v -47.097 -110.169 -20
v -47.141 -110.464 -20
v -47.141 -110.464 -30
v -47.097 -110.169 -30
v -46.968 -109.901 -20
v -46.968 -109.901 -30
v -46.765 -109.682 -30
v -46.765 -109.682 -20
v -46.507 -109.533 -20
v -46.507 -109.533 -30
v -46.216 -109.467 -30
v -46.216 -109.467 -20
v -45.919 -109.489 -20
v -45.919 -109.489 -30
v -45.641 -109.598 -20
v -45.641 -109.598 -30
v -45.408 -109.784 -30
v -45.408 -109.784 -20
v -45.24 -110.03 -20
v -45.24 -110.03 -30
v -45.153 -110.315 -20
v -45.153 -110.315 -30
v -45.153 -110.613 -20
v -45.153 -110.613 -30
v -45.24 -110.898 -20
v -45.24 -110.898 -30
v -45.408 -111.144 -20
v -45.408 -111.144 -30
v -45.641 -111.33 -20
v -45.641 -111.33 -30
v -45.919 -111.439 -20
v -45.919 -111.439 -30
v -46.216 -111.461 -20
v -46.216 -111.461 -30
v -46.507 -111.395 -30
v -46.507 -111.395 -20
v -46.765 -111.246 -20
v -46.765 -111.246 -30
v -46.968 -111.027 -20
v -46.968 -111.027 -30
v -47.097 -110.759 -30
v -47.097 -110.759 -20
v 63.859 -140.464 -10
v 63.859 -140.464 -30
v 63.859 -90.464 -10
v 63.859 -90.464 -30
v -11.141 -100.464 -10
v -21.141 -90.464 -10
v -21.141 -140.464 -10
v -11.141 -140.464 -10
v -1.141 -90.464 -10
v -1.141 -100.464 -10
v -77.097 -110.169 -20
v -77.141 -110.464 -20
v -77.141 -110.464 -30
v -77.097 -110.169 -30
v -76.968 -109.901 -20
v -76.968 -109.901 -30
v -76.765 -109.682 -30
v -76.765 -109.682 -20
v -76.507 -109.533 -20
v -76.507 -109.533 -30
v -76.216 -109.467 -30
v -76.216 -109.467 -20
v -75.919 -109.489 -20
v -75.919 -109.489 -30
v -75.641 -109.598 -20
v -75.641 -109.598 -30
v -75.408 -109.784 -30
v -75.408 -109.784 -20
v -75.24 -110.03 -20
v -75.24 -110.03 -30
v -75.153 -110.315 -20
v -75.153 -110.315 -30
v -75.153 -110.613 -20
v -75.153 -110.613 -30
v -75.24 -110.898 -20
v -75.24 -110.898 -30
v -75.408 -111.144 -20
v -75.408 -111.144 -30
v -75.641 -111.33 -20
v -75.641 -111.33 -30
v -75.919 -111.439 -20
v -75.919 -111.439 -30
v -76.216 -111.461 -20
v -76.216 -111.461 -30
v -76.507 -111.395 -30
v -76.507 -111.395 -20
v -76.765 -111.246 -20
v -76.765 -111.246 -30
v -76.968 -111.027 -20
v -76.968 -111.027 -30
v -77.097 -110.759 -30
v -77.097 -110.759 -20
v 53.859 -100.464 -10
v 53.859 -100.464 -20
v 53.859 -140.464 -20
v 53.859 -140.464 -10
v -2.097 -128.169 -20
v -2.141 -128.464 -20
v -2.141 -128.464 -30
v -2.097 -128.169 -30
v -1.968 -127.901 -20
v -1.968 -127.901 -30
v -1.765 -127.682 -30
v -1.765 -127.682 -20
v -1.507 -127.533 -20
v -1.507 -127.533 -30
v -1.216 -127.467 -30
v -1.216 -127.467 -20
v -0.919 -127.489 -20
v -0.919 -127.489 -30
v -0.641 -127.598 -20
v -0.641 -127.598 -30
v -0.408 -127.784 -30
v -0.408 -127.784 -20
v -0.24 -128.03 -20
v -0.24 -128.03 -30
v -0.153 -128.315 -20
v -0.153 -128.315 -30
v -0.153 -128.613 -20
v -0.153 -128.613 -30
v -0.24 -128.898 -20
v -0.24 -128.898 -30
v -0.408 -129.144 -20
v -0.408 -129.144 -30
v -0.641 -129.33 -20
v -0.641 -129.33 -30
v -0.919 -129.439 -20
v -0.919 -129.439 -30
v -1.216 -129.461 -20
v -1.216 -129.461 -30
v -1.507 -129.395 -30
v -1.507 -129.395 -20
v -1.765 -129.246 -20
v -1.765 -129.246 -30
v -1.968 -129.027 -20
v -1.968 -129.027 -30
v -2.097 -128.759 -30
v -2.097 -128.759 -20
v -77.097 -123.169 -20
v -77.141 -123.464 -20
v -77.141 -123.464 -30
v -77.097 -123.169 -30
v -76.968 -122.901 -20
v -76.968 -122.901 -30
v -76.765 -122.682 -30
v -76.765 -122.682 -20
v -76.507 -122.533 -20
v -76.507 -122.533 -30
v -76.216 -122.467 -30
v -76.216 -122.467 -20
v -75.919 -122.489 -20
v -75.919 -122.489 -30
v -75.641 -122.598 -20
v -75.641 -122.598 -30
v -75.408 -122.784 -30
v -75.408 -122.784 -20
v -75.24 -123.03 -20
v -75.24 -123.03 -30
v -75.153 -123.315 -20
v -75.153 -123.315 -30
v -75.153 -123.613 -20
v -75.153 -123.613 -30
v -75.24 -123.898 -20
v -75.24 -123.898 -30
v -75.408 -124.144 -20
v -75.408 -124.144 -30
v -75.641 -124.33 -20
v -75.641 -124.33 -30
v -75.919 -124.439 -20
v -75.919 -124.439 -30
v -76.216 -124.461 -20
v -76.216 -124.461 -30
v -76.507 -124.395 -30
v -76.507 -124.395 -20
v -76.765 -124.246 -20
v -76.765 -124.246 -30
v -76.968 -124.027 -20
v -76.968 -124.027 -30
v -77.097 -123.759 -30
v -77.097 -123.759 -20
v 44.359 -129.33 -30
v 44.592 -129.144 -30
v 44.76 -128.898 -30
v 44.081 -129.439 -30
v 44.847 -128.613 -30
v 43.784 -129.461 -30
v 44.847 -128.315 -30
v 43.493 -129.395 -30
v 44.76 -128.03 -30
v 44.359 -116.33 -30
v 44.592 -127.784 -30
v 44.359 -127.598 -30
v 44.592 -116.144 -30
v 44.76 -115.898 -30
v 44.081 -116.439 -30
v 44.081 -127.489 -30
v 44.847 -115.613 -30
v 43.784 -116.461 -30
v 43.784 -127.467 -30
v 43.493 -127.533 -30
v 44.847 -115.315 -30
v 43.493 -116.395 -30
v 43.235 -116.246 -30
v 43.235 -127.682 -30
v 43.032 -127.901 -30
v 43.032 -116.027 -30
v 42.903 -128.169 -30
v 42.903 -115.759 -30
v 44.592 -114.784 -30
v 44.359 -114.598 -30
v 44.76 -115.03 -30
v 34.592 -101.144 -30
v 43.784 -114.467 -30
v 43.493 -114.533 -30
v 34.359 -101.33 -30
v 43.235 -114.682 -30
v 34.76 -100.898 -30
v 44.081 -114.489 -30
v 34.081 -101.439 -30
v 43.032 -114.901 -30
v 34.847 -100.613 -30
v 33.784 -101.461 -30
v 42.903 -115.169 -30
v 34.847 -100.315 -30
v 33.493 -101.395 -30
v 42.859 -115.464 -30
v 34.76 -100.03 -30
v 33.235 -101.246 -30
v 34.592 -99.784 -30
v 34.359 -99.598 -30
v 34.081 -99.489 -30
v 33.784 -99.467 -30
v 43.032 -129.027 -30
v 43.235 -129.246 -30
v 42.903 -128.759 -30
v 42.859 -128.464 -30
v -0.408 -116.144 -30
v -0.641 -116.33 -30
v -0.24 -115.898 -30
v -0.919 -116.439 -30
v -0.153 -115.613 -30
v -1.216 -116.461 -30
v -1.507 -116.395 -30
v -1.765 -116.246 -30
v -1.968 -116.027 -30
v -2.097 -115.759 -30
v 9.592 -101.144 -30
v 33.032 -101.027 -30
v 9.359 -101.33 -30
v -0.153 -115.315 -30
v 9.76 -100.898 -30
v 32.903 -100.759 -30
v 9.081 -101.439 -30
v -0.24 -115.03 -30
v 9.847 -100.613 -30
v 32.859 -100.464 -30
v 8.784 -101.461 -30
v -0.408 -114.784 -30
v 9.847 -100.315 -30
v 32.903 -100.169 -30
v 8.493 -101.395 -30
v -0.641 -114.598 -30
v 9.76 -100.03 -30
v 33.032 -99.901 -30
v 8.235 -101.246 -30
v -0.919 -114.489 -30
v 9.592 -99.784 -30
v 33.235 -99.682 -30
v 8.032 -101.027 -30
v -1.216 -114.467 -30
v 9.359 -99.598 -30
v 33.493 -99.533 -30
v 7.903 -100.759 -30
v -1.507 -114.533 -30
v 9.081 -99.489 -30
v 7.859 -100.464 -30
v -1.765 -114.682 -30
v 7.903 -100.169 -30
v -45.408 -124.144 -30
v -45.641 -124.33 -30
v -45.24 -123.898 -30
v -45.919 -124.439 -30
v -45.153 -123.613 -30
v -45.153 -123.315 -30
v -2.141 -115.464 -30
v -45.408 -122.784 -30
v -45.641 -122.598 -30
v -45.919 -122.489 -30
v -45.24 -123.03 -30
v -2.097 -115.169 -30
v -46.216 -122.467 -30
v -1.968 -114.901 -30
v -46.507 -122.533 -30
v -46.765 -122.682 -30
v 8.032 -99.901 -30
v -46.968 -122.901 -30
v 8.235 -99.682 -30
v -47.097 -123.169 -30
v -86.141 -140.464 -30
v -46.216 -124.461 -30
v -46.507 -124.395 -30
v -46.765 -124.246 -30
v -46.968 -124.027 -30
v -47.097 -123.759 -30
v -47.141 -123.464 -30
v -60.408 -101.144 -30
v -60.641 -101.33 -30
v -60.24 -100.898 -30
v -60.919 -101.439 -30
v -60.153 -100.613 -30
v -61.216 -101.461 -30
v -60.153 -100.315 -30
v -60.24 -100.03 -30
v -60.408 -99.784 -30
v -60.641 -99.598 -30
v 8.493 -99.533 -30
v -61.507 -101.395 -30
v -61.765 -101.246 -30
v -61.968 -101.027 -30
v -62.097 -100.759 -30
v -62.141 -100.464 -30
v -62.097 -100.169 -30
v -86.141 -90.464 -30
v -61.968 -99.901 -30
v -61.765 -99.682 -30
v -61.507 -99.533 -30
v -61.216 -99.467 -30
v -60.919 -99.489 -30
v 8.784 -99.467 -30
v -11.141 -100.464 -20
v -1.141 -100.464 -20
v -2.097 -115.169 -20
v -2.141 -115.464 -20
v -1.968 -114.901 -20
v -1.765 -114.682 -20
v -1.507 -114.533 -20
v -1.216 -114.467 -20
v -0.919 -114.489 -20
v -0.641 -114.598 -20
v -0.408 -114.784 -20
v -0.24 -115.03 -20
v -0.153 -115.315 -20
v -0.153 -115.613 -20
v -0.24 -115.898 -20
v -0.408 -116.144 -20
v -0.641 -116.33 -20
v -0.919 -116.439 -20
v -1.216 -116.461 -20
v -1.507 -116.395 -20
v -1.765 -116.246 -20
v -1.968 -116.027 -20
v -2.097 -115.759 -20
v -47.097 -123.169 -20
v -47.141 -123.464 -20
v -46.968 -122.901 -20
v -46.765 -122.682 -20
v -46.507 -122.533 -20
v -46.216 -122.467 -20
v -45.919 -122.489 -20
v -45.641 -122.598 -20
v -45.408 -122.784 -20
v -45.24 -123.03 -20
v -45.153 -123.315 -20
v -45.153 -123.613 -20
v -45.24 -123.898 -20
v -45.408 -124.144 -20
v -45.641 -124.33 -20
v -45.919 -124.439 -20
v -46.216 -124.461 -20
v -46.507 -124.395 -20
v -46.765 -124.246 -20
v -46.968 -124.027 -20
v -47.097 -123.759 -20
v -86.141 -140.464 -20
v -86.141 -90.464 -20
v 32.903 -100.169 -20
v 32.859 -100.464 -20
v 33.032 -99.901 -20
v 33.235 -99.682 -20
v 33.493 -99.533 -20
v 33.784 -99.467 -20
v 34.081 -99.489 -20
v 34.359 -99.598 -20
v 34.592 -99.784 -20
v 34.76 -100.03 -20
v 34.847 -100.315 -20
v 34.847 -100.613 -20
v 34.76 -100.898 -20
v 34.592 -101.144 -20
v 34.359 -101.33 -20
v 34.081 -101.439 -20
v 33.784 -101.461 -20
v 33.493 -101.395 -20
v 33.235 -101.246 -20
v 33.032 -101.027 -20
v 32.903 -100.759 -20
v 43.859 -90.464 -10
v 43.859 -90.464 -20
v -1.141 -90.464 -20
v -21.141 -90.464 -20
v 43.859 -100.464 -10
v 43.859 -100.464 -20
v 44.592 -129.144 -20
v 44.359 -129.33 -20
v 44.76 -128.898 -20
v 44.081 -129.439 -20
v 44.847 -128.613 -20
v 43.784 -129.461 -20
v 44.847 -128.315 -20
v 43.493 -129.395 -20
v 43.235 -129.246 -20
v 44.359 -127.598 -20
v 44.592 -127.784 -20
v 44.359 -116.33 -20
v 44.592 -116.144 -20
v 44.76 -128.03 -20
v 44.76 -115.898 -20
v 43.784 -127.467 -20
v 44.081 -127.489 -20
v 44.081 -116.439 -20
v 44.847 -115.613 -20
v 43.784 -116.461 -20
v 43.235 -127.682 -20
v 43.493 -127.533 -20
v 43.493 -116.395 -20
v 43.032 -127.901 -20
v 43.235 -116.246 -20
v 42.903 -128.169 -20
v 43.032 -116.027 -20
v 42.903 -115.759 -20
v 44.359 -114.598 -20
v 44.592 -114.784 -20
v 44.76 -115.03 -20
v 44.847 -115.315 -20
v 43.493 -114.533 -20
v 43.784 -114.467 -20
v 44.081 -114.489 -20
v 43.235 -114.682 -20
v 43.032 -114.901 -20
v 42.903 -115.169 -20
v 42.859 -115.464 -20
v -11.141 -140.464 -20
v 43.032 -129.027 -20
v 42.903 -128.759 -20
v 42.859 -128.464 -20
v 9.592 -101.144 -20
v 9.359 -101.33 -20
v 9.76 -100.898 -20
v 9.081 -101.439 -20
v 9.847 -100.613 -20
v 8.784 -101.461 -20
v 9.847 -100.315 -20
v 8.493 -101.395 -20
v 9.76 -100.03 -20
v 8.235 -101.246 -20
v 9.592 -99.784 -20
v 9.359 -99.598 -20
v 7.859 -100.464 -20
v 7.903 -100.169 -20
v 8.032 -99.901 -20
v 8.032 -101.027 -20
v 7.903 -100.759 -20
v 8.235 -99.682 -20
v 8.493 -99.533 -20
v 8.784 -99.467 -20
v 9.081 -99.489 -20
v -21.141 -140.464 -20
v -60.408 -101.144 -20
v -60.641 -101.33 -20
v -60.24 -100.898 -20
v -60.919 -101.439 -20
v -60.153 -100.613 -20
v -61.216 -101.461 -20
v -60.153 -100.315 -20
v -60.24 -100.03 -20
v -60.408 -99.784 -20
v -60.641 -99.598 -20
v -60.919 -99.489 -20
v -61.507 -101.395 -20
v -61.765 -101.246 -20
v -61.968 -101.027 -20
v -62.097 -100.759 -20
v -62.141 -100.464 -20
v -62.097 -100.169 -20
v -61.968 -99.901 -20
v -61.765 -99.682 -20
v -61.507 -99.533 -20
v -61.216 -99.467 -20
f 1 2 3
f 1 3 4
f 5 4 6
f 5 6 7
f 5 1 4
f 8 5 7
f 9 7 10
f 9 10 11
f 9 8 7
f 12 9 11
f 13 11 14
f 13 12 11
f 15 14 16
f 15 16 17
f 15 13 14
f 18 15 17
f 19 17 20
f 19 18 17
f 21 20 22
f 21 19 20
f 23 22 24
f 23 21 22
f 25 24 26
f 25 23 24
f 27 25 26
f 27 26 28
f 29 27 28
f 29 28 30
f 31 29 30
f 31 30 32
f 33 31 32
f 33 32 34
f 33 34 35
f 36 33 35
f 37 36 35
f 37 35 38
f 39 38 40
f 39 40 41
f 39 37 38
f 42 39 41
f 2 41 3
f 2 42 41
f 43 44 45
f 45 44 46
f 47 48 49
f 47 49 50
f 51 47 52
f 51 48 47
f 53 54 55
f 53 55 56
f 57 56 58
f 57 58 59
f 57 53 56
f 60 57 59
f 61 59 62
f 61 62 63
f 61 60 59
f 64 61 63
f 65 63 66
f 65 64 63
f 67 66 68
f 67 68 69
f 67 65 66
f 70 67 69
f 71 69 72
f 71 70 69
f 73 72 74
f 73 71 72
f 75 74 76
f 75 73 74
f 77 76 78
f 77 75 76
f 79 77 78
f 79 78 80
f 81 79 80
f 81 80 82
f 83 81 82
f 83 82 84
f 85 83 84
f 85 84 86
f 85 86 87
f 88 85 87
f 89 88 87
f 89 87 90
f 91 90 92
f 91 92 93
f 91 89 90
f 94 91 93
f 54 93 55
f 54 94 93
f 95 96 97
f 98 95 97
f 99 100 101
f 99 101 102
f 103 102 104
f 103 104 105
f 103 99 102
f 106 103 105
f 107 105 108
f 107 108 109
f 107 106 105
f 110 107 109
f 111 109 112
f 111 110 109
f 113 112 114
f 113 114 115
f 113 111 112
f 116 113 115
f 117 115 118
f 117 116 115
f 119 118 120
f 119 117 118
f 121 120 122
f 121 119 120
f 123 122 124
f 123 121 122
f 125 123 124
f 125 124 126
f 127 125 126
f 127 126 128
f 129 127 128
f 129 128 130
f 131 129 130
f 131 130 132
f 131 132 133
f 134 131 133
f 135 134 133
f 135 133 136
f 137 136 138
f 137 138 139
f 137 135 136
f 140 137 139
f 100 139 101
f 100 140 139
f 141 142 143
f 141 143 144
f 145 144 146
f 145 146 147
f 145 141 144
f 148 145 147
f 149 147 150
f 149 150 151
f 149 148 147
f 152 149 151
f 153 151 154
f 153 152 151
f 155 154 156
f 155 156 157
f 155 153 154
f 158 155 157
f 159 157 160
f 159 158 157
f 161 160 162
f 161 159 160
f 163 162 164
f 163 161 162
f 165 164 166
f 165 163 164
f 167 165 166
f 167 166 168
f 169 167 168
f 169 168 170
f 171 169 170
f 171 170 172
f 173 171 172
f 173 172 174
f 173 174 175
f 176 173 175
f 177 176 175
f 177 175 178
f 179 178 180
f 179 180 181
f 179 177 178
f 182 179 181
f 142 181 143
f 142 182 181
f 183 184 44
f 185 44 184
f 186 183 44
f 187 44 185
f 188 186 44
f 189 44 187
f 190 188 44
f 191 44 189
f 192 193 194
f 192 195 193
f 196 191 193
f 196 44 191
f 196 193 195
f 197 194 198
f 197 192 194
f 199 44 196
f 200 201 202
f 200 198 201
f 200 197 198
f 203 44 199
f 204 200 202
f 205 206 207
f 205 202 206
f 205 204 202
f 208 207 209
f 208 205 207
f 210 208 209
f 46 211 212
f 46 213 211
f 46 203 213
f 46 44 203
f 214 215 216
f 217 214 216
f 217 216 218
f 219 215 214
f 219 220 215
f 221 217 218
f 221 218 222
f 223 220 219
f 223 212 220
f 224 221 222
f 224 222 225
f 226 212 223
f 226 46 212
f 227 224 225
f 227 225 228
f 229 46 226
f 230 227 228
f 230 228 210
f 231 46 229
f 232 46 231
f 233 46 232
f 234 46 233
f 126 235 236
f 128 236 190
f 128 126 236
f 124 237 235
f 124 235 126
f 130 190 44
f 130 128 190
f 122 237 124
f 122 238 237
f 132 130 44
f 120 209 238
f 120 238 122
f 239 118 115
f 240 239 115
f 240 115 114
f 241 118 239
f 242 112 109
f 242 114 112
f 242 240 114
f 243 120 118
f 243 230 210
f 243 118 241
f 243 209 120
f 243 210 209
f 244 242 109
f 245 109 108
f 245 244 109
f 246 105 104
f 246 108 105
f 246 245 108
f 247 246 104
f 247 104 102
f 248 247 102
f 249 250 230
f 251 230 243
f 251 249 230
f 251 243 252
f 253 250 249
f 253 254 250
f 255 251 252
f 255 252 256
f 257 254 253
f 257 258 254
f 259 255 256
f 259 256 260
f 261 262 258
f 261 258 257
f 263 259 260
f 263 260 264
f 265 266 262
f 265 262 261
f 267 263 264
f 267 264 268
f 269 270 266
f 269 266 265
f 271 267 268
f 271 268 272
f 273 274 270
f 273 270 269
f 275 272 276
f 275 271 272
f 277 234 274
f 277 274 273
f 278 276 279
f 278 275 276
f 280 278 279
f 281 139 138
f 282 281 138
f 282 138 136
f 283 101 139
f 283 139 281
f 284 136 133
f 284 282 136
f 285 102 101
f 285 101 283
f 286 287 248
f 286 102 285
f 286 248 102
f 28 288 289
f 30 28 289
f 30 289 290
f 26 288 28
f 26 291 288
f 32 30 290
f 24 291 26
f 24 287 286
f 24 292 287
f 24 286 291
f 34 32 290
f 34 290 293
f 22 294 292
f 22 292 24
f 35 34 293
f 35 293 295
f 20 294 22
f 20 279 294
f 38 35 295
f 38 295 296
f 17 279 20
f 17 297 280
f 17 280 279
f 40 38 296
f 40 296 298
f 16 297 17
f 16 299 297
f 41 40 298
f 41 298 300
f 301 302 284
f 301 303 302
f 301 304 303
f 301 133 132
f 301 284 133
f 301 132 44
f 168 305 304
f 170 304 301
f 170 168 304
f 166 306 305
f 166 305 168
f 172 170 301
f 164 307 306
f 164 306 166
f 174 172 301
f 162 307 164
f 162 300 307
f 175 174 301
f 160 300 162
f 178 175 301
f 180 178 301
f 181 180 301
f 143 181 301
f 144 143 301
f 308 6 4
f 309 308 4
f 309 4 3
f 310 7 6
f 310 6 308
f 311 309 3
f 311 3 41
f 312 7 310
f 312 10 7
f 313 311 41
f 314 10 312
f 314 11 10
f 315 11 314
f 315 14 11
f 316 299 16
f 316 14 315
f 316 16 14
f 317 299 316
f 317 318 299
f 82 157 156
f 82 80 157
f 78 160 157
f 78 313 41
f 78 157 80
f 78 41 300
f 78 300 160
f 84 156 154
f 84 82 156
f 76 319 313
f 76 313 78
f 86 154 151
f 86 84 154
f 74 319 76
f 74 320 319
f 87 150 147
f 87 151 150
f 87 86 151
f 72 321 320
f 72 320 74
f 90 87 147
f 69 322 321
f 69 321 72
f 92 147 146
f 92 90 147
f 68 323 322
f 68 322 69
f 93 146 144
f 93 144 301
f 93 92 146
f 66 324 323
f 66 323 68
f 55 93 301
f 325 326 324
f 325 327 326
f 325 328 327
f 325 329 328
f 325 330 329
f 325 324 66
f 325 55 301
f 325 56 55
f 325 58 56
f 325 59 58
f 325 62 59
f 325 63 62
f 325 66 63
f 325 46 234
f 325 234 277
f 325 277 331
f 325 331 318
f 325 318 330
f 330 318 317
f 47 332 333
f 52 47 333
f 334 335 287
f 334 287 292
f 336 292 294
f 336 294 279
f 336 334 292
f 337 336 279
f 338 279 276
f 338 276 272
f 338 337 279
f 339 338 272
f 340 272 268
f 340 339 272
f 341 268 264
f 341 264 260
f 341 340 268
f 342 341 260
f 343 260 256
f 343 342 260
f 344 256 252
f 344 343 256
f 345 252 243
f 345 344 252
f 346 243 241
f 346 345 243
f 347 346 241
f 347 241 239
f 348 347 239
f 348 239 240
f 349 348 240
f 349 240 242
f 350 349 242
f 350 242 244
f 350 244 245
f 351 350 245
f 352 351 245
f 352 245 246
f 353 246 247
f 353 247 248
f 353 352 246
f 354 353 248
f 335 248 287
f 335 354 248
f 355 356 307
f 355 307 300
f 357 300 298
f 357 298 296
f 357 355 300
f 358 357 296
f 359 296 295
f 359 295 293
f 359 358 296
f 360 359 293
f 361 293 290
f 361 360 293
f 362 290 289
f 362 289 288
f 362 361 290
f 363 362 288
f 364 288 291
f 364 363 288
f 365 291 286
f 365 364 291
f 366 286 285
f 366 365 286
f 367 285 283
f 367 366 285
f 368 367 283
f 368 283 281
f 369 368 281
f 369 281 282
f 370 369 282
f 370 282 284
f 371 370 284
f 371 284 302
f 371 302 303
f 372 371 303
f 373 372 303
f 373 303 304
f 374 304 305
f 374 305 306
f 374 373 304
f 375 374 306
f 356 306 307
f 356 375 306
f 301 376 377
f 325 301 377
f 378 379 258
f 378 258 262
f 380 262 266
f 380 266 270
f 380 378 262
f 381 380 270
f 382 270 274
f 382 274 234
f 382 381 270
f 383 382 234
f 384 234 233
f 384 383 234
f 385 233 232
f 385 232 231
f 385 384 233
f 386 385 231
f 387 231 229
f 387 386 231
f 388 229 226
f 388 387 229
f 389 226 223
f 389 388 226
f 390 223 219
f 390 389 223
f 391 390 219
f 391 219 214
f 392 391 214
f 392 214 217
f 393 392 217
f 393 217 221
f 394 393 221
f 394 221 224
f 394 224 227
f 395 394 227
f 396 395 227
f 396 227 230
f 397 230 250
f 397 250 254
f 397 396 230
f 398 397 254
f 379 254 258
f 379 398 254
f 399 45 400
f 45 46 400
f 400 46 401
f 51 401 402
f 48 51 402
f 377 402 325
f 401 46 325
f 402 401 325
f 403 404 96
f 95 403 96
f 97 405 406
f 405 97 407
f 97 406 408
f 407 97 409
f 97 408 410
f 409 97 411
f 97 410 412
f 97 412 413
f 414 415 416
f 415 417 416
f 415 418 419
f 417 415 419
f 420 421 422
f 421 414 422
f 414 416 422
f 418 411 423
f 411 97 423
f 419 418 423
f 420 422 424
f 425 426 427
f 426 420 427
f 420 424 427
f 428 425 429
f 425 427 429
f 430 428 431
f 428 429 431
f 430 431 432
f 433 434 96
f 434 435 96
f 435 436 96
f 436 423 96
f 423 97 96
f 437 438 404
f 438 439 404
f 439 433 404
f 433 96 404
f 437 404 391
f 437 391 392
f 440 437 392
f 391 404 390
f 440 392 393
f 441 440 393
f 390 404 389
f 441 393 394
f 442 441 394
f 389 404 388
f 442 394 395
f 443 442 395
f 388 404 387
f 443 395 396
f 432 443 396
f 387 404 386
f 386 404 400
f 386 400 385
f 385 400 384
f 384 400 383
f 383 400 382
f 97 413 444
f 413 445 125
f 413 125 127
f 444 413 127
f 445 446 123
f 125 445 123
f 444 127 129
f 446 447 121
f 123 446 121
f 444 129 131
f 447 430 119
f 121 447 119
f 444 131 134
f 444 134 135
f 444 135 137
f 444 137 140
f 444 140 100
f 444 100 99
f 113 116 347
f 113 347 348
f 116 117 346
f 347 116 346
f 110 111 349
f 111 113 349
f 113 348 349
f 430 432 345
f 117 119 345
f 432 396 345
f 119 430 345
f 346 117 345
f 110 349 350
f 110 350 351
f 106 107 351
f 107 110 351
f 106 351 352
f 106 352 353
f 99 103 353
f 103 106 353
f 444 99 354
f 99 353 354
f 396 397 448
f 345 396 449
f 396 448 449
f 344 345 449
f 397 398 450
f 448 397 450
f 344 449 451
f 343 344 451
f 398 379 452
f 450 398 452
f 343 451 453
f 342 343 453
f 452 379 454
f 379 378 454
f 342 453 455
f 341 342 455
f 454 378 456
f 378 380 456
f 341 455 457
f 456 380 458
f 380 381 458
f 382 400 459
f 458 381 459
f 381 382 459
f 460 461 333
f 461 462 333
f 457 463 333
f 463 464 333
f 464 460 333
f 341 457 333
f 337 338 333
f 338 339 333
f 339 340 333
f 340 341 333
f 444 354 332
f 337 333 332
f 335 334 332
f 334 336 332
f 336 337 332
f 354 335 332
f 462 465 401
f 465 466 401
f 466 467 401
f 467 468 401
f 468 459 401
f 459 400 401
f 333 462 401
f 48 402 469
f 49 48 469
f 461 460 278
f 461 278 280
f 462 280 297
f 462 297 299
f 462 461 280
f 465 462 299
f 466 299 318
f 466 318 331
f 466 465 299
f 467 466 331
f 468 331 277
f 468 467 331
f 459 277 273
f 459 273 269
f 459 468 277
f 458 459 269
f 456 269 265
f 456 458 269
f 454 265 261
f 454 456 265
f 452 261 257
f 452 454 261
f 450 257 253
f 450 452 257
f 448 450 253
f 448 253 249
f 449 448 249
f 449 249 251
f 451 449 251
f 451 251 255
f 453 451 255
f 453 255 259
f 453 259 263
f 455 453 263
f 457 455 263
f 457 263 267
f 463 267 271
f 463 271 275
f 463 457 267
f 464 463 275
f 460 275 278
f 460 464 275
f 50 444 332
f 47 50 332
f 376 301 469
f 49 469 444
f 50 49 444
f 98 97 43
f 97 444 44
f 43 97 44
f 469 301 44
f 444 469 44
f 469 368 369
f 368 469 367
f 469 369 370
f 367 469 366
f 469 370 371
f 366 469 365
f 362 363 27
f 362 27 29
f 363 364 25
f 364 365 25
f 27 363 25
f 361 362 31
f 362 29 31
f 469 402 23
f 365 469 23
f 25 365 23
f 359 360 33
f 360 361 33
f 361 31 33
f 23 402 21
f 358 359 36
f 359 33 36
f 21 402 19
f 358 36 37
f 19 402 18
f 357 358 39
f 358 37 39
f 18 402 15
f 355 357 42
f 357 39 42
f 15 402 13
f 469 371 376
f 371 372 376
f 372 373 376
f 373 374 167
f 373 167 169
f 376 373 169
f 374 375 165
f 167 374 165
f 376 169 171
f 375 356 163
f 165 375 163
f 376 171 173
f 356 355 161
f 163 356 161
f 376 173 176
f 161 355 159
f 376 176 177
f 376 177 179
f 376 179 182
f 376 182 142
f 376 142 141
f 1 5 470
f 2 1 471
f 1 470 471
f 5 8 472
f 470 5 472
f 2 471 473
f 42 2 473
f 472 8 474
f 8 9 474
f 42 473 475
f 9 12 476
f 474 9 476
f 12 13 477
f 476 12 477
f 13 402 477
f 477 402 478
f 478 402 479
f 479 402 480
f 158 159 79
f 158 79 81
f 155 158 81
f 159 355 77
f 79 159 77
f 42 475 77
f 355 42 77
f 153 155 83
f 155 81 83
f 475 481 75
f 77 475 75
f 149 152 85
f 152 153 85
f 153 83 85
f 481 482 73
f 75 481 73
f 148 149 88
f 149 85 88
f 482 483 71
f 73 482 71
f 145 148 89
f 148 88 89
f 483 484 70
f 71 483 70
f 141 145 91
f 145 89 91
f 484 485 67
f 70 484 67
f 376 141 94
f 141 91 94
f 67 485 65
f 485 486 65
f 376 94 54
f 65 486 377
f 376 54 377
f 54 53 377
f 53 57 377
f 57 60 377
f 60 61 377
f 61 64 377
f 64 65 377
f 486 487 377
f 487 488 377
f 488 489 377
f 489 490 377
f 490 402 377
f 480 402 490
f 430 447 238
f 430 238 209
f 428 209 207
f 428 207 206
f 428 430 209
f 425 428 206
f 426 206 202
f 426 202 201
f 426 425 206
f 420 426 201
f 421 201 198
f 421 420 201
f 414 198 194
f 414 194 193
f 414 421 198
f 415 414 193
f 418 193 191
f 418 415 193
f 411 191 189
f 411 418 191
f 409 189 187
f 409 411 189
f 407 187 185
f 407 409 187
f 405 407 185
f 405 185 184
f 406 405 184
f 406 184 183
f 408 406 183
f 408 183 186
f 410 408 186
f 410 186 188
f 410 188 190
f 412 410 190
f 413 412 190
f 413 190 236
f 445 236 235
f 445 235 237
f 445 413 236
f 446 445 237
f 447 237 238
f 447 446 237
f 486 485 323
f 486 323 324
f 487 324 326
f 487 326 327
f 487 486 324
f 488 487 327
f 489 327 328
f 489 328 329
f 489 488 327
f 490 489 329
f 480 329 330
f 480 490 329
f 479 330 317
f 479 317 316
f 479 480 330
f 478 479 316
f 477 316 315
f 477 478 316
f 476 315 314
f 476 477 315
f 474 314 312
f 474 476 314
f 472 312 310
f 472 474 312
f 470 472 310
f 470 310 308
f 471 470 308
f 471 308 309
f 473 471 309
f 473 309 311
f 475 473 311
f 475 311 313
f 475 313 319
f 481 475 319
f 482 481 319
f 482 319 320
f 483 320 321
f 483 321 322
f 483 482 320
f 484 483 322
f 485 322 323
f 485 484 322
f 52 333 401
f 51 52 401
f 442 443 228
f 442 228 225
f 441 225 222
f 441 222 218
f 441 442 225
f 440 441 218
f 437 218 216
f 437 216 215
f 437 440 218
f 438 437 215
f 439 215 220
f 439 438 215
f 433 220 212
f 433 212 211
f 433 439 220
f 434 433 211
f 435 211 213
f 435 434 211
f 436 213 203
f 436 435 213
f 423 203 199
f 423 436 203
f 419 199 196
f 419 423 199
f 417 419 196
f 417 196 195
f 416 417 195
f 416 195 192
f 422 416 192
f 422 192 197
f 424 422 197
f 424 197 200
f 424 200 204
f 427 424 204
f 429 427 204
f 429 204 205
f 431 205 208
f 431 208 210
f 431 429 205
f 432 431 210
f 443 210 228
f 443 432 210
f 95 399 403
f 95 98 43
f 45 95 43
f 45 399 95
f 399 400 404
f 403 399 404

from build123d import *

# Parameters (mm, degrees)
ESQUISSE1_W        = 150
ESQUISSE1_H        = 50
ESQUISSE1_R        = 1
BOSS_EXTRU_4_DEPTH = 10
BOSS_EXTRU_5_DEPTH = 10


with BuildPart() as part:
    # Esquisse1 → Boss.-Extru.4 (new body)
    with BuildSketch(Plane(origin=(0, 0, -20), x_dir=(-1, 0, 0), z_dir=(0, 0, -1))):
        with Locations((11.141434162, -115.464178298)):
            Rectangle(ESQUISSE1_W, ESQUISSE1_H)
        with Locations((-43.858565838, -128.464178298)):
            Circle(ESQUISSE1_R, mode=Mode.SUBTRACT)
        with Locations((-43.858565838, -115.464178298)):
            Circle(ESQUISSE1_R, mode=Mode.SUBTRACT)
        with Locations((-33.858565838, -100.464178298)):
            Circle(ESQUISSE1_R, mode=Mode.SUBTRACT)
        with Locations((-8.858565838, -100.464178298)):
            Circle(ESQUISSE1_R, mode=Mode.SUBTRACT)
        with Locations((1.141434162, -115.464178298)):
            Circle(ESQUISSE1_R, mode=Mode.SUBTRACT)
        with Locations((1.141434162, -128.464178298)):
            Circle(ESQUISSE1_R, mode=Mode.SUBTRACT)
        with Locations((46.141434162, -123.464178298)):
            Circle(ESQUISSE1_R, mode=Mode.SUBTRACT)
        with Locations((46.141434162, -110.464178298)):
            Circle(ESQUISSE1_R, mode=Mode.SUBTRACT)
        with Locations((61.141434162, -100.464178298)):
            Circle(ESQUISSE1_R, mode=Mode.SUBTRACT)
        with Locations((76.141434162, -110.464178298)):
            Circle(ESQUISSE1_R, mode=Mode.SUBTRACT)
        with Locations((76.141434162, -123.464178298)):
            Circle(ESQUISSE1_R, mode=Mode.SUBTRACT)
    extrude(amount=BOSS_EXTRU_4_DEPTH)

    # Esquisse3 → Boss.-Extru.5 (add)
    with BuildSketch(Plane.XY.offset(-20)):
        Polygon((-1.141434162, -100.464178298), (-1.141434162, -90.464178298), (-21.141434162, -90.464178298), (-21.141434162, -140.464178298), (-11.141434162, -140.464178298), (-11.141434162, -100.464178298), align=None)
        Polygon((63.858565838, -140.464178298), (63.858565838, -90.464178298), (43.858565838, -90.464178298), (43.858565838, -100.464178298), (53.858565838, -100.464178298), (53.858565838, -140.464178298), align=None)
    extrude(amount=BOSS_EXTRU_5_DEPTH)


solid = part.part
